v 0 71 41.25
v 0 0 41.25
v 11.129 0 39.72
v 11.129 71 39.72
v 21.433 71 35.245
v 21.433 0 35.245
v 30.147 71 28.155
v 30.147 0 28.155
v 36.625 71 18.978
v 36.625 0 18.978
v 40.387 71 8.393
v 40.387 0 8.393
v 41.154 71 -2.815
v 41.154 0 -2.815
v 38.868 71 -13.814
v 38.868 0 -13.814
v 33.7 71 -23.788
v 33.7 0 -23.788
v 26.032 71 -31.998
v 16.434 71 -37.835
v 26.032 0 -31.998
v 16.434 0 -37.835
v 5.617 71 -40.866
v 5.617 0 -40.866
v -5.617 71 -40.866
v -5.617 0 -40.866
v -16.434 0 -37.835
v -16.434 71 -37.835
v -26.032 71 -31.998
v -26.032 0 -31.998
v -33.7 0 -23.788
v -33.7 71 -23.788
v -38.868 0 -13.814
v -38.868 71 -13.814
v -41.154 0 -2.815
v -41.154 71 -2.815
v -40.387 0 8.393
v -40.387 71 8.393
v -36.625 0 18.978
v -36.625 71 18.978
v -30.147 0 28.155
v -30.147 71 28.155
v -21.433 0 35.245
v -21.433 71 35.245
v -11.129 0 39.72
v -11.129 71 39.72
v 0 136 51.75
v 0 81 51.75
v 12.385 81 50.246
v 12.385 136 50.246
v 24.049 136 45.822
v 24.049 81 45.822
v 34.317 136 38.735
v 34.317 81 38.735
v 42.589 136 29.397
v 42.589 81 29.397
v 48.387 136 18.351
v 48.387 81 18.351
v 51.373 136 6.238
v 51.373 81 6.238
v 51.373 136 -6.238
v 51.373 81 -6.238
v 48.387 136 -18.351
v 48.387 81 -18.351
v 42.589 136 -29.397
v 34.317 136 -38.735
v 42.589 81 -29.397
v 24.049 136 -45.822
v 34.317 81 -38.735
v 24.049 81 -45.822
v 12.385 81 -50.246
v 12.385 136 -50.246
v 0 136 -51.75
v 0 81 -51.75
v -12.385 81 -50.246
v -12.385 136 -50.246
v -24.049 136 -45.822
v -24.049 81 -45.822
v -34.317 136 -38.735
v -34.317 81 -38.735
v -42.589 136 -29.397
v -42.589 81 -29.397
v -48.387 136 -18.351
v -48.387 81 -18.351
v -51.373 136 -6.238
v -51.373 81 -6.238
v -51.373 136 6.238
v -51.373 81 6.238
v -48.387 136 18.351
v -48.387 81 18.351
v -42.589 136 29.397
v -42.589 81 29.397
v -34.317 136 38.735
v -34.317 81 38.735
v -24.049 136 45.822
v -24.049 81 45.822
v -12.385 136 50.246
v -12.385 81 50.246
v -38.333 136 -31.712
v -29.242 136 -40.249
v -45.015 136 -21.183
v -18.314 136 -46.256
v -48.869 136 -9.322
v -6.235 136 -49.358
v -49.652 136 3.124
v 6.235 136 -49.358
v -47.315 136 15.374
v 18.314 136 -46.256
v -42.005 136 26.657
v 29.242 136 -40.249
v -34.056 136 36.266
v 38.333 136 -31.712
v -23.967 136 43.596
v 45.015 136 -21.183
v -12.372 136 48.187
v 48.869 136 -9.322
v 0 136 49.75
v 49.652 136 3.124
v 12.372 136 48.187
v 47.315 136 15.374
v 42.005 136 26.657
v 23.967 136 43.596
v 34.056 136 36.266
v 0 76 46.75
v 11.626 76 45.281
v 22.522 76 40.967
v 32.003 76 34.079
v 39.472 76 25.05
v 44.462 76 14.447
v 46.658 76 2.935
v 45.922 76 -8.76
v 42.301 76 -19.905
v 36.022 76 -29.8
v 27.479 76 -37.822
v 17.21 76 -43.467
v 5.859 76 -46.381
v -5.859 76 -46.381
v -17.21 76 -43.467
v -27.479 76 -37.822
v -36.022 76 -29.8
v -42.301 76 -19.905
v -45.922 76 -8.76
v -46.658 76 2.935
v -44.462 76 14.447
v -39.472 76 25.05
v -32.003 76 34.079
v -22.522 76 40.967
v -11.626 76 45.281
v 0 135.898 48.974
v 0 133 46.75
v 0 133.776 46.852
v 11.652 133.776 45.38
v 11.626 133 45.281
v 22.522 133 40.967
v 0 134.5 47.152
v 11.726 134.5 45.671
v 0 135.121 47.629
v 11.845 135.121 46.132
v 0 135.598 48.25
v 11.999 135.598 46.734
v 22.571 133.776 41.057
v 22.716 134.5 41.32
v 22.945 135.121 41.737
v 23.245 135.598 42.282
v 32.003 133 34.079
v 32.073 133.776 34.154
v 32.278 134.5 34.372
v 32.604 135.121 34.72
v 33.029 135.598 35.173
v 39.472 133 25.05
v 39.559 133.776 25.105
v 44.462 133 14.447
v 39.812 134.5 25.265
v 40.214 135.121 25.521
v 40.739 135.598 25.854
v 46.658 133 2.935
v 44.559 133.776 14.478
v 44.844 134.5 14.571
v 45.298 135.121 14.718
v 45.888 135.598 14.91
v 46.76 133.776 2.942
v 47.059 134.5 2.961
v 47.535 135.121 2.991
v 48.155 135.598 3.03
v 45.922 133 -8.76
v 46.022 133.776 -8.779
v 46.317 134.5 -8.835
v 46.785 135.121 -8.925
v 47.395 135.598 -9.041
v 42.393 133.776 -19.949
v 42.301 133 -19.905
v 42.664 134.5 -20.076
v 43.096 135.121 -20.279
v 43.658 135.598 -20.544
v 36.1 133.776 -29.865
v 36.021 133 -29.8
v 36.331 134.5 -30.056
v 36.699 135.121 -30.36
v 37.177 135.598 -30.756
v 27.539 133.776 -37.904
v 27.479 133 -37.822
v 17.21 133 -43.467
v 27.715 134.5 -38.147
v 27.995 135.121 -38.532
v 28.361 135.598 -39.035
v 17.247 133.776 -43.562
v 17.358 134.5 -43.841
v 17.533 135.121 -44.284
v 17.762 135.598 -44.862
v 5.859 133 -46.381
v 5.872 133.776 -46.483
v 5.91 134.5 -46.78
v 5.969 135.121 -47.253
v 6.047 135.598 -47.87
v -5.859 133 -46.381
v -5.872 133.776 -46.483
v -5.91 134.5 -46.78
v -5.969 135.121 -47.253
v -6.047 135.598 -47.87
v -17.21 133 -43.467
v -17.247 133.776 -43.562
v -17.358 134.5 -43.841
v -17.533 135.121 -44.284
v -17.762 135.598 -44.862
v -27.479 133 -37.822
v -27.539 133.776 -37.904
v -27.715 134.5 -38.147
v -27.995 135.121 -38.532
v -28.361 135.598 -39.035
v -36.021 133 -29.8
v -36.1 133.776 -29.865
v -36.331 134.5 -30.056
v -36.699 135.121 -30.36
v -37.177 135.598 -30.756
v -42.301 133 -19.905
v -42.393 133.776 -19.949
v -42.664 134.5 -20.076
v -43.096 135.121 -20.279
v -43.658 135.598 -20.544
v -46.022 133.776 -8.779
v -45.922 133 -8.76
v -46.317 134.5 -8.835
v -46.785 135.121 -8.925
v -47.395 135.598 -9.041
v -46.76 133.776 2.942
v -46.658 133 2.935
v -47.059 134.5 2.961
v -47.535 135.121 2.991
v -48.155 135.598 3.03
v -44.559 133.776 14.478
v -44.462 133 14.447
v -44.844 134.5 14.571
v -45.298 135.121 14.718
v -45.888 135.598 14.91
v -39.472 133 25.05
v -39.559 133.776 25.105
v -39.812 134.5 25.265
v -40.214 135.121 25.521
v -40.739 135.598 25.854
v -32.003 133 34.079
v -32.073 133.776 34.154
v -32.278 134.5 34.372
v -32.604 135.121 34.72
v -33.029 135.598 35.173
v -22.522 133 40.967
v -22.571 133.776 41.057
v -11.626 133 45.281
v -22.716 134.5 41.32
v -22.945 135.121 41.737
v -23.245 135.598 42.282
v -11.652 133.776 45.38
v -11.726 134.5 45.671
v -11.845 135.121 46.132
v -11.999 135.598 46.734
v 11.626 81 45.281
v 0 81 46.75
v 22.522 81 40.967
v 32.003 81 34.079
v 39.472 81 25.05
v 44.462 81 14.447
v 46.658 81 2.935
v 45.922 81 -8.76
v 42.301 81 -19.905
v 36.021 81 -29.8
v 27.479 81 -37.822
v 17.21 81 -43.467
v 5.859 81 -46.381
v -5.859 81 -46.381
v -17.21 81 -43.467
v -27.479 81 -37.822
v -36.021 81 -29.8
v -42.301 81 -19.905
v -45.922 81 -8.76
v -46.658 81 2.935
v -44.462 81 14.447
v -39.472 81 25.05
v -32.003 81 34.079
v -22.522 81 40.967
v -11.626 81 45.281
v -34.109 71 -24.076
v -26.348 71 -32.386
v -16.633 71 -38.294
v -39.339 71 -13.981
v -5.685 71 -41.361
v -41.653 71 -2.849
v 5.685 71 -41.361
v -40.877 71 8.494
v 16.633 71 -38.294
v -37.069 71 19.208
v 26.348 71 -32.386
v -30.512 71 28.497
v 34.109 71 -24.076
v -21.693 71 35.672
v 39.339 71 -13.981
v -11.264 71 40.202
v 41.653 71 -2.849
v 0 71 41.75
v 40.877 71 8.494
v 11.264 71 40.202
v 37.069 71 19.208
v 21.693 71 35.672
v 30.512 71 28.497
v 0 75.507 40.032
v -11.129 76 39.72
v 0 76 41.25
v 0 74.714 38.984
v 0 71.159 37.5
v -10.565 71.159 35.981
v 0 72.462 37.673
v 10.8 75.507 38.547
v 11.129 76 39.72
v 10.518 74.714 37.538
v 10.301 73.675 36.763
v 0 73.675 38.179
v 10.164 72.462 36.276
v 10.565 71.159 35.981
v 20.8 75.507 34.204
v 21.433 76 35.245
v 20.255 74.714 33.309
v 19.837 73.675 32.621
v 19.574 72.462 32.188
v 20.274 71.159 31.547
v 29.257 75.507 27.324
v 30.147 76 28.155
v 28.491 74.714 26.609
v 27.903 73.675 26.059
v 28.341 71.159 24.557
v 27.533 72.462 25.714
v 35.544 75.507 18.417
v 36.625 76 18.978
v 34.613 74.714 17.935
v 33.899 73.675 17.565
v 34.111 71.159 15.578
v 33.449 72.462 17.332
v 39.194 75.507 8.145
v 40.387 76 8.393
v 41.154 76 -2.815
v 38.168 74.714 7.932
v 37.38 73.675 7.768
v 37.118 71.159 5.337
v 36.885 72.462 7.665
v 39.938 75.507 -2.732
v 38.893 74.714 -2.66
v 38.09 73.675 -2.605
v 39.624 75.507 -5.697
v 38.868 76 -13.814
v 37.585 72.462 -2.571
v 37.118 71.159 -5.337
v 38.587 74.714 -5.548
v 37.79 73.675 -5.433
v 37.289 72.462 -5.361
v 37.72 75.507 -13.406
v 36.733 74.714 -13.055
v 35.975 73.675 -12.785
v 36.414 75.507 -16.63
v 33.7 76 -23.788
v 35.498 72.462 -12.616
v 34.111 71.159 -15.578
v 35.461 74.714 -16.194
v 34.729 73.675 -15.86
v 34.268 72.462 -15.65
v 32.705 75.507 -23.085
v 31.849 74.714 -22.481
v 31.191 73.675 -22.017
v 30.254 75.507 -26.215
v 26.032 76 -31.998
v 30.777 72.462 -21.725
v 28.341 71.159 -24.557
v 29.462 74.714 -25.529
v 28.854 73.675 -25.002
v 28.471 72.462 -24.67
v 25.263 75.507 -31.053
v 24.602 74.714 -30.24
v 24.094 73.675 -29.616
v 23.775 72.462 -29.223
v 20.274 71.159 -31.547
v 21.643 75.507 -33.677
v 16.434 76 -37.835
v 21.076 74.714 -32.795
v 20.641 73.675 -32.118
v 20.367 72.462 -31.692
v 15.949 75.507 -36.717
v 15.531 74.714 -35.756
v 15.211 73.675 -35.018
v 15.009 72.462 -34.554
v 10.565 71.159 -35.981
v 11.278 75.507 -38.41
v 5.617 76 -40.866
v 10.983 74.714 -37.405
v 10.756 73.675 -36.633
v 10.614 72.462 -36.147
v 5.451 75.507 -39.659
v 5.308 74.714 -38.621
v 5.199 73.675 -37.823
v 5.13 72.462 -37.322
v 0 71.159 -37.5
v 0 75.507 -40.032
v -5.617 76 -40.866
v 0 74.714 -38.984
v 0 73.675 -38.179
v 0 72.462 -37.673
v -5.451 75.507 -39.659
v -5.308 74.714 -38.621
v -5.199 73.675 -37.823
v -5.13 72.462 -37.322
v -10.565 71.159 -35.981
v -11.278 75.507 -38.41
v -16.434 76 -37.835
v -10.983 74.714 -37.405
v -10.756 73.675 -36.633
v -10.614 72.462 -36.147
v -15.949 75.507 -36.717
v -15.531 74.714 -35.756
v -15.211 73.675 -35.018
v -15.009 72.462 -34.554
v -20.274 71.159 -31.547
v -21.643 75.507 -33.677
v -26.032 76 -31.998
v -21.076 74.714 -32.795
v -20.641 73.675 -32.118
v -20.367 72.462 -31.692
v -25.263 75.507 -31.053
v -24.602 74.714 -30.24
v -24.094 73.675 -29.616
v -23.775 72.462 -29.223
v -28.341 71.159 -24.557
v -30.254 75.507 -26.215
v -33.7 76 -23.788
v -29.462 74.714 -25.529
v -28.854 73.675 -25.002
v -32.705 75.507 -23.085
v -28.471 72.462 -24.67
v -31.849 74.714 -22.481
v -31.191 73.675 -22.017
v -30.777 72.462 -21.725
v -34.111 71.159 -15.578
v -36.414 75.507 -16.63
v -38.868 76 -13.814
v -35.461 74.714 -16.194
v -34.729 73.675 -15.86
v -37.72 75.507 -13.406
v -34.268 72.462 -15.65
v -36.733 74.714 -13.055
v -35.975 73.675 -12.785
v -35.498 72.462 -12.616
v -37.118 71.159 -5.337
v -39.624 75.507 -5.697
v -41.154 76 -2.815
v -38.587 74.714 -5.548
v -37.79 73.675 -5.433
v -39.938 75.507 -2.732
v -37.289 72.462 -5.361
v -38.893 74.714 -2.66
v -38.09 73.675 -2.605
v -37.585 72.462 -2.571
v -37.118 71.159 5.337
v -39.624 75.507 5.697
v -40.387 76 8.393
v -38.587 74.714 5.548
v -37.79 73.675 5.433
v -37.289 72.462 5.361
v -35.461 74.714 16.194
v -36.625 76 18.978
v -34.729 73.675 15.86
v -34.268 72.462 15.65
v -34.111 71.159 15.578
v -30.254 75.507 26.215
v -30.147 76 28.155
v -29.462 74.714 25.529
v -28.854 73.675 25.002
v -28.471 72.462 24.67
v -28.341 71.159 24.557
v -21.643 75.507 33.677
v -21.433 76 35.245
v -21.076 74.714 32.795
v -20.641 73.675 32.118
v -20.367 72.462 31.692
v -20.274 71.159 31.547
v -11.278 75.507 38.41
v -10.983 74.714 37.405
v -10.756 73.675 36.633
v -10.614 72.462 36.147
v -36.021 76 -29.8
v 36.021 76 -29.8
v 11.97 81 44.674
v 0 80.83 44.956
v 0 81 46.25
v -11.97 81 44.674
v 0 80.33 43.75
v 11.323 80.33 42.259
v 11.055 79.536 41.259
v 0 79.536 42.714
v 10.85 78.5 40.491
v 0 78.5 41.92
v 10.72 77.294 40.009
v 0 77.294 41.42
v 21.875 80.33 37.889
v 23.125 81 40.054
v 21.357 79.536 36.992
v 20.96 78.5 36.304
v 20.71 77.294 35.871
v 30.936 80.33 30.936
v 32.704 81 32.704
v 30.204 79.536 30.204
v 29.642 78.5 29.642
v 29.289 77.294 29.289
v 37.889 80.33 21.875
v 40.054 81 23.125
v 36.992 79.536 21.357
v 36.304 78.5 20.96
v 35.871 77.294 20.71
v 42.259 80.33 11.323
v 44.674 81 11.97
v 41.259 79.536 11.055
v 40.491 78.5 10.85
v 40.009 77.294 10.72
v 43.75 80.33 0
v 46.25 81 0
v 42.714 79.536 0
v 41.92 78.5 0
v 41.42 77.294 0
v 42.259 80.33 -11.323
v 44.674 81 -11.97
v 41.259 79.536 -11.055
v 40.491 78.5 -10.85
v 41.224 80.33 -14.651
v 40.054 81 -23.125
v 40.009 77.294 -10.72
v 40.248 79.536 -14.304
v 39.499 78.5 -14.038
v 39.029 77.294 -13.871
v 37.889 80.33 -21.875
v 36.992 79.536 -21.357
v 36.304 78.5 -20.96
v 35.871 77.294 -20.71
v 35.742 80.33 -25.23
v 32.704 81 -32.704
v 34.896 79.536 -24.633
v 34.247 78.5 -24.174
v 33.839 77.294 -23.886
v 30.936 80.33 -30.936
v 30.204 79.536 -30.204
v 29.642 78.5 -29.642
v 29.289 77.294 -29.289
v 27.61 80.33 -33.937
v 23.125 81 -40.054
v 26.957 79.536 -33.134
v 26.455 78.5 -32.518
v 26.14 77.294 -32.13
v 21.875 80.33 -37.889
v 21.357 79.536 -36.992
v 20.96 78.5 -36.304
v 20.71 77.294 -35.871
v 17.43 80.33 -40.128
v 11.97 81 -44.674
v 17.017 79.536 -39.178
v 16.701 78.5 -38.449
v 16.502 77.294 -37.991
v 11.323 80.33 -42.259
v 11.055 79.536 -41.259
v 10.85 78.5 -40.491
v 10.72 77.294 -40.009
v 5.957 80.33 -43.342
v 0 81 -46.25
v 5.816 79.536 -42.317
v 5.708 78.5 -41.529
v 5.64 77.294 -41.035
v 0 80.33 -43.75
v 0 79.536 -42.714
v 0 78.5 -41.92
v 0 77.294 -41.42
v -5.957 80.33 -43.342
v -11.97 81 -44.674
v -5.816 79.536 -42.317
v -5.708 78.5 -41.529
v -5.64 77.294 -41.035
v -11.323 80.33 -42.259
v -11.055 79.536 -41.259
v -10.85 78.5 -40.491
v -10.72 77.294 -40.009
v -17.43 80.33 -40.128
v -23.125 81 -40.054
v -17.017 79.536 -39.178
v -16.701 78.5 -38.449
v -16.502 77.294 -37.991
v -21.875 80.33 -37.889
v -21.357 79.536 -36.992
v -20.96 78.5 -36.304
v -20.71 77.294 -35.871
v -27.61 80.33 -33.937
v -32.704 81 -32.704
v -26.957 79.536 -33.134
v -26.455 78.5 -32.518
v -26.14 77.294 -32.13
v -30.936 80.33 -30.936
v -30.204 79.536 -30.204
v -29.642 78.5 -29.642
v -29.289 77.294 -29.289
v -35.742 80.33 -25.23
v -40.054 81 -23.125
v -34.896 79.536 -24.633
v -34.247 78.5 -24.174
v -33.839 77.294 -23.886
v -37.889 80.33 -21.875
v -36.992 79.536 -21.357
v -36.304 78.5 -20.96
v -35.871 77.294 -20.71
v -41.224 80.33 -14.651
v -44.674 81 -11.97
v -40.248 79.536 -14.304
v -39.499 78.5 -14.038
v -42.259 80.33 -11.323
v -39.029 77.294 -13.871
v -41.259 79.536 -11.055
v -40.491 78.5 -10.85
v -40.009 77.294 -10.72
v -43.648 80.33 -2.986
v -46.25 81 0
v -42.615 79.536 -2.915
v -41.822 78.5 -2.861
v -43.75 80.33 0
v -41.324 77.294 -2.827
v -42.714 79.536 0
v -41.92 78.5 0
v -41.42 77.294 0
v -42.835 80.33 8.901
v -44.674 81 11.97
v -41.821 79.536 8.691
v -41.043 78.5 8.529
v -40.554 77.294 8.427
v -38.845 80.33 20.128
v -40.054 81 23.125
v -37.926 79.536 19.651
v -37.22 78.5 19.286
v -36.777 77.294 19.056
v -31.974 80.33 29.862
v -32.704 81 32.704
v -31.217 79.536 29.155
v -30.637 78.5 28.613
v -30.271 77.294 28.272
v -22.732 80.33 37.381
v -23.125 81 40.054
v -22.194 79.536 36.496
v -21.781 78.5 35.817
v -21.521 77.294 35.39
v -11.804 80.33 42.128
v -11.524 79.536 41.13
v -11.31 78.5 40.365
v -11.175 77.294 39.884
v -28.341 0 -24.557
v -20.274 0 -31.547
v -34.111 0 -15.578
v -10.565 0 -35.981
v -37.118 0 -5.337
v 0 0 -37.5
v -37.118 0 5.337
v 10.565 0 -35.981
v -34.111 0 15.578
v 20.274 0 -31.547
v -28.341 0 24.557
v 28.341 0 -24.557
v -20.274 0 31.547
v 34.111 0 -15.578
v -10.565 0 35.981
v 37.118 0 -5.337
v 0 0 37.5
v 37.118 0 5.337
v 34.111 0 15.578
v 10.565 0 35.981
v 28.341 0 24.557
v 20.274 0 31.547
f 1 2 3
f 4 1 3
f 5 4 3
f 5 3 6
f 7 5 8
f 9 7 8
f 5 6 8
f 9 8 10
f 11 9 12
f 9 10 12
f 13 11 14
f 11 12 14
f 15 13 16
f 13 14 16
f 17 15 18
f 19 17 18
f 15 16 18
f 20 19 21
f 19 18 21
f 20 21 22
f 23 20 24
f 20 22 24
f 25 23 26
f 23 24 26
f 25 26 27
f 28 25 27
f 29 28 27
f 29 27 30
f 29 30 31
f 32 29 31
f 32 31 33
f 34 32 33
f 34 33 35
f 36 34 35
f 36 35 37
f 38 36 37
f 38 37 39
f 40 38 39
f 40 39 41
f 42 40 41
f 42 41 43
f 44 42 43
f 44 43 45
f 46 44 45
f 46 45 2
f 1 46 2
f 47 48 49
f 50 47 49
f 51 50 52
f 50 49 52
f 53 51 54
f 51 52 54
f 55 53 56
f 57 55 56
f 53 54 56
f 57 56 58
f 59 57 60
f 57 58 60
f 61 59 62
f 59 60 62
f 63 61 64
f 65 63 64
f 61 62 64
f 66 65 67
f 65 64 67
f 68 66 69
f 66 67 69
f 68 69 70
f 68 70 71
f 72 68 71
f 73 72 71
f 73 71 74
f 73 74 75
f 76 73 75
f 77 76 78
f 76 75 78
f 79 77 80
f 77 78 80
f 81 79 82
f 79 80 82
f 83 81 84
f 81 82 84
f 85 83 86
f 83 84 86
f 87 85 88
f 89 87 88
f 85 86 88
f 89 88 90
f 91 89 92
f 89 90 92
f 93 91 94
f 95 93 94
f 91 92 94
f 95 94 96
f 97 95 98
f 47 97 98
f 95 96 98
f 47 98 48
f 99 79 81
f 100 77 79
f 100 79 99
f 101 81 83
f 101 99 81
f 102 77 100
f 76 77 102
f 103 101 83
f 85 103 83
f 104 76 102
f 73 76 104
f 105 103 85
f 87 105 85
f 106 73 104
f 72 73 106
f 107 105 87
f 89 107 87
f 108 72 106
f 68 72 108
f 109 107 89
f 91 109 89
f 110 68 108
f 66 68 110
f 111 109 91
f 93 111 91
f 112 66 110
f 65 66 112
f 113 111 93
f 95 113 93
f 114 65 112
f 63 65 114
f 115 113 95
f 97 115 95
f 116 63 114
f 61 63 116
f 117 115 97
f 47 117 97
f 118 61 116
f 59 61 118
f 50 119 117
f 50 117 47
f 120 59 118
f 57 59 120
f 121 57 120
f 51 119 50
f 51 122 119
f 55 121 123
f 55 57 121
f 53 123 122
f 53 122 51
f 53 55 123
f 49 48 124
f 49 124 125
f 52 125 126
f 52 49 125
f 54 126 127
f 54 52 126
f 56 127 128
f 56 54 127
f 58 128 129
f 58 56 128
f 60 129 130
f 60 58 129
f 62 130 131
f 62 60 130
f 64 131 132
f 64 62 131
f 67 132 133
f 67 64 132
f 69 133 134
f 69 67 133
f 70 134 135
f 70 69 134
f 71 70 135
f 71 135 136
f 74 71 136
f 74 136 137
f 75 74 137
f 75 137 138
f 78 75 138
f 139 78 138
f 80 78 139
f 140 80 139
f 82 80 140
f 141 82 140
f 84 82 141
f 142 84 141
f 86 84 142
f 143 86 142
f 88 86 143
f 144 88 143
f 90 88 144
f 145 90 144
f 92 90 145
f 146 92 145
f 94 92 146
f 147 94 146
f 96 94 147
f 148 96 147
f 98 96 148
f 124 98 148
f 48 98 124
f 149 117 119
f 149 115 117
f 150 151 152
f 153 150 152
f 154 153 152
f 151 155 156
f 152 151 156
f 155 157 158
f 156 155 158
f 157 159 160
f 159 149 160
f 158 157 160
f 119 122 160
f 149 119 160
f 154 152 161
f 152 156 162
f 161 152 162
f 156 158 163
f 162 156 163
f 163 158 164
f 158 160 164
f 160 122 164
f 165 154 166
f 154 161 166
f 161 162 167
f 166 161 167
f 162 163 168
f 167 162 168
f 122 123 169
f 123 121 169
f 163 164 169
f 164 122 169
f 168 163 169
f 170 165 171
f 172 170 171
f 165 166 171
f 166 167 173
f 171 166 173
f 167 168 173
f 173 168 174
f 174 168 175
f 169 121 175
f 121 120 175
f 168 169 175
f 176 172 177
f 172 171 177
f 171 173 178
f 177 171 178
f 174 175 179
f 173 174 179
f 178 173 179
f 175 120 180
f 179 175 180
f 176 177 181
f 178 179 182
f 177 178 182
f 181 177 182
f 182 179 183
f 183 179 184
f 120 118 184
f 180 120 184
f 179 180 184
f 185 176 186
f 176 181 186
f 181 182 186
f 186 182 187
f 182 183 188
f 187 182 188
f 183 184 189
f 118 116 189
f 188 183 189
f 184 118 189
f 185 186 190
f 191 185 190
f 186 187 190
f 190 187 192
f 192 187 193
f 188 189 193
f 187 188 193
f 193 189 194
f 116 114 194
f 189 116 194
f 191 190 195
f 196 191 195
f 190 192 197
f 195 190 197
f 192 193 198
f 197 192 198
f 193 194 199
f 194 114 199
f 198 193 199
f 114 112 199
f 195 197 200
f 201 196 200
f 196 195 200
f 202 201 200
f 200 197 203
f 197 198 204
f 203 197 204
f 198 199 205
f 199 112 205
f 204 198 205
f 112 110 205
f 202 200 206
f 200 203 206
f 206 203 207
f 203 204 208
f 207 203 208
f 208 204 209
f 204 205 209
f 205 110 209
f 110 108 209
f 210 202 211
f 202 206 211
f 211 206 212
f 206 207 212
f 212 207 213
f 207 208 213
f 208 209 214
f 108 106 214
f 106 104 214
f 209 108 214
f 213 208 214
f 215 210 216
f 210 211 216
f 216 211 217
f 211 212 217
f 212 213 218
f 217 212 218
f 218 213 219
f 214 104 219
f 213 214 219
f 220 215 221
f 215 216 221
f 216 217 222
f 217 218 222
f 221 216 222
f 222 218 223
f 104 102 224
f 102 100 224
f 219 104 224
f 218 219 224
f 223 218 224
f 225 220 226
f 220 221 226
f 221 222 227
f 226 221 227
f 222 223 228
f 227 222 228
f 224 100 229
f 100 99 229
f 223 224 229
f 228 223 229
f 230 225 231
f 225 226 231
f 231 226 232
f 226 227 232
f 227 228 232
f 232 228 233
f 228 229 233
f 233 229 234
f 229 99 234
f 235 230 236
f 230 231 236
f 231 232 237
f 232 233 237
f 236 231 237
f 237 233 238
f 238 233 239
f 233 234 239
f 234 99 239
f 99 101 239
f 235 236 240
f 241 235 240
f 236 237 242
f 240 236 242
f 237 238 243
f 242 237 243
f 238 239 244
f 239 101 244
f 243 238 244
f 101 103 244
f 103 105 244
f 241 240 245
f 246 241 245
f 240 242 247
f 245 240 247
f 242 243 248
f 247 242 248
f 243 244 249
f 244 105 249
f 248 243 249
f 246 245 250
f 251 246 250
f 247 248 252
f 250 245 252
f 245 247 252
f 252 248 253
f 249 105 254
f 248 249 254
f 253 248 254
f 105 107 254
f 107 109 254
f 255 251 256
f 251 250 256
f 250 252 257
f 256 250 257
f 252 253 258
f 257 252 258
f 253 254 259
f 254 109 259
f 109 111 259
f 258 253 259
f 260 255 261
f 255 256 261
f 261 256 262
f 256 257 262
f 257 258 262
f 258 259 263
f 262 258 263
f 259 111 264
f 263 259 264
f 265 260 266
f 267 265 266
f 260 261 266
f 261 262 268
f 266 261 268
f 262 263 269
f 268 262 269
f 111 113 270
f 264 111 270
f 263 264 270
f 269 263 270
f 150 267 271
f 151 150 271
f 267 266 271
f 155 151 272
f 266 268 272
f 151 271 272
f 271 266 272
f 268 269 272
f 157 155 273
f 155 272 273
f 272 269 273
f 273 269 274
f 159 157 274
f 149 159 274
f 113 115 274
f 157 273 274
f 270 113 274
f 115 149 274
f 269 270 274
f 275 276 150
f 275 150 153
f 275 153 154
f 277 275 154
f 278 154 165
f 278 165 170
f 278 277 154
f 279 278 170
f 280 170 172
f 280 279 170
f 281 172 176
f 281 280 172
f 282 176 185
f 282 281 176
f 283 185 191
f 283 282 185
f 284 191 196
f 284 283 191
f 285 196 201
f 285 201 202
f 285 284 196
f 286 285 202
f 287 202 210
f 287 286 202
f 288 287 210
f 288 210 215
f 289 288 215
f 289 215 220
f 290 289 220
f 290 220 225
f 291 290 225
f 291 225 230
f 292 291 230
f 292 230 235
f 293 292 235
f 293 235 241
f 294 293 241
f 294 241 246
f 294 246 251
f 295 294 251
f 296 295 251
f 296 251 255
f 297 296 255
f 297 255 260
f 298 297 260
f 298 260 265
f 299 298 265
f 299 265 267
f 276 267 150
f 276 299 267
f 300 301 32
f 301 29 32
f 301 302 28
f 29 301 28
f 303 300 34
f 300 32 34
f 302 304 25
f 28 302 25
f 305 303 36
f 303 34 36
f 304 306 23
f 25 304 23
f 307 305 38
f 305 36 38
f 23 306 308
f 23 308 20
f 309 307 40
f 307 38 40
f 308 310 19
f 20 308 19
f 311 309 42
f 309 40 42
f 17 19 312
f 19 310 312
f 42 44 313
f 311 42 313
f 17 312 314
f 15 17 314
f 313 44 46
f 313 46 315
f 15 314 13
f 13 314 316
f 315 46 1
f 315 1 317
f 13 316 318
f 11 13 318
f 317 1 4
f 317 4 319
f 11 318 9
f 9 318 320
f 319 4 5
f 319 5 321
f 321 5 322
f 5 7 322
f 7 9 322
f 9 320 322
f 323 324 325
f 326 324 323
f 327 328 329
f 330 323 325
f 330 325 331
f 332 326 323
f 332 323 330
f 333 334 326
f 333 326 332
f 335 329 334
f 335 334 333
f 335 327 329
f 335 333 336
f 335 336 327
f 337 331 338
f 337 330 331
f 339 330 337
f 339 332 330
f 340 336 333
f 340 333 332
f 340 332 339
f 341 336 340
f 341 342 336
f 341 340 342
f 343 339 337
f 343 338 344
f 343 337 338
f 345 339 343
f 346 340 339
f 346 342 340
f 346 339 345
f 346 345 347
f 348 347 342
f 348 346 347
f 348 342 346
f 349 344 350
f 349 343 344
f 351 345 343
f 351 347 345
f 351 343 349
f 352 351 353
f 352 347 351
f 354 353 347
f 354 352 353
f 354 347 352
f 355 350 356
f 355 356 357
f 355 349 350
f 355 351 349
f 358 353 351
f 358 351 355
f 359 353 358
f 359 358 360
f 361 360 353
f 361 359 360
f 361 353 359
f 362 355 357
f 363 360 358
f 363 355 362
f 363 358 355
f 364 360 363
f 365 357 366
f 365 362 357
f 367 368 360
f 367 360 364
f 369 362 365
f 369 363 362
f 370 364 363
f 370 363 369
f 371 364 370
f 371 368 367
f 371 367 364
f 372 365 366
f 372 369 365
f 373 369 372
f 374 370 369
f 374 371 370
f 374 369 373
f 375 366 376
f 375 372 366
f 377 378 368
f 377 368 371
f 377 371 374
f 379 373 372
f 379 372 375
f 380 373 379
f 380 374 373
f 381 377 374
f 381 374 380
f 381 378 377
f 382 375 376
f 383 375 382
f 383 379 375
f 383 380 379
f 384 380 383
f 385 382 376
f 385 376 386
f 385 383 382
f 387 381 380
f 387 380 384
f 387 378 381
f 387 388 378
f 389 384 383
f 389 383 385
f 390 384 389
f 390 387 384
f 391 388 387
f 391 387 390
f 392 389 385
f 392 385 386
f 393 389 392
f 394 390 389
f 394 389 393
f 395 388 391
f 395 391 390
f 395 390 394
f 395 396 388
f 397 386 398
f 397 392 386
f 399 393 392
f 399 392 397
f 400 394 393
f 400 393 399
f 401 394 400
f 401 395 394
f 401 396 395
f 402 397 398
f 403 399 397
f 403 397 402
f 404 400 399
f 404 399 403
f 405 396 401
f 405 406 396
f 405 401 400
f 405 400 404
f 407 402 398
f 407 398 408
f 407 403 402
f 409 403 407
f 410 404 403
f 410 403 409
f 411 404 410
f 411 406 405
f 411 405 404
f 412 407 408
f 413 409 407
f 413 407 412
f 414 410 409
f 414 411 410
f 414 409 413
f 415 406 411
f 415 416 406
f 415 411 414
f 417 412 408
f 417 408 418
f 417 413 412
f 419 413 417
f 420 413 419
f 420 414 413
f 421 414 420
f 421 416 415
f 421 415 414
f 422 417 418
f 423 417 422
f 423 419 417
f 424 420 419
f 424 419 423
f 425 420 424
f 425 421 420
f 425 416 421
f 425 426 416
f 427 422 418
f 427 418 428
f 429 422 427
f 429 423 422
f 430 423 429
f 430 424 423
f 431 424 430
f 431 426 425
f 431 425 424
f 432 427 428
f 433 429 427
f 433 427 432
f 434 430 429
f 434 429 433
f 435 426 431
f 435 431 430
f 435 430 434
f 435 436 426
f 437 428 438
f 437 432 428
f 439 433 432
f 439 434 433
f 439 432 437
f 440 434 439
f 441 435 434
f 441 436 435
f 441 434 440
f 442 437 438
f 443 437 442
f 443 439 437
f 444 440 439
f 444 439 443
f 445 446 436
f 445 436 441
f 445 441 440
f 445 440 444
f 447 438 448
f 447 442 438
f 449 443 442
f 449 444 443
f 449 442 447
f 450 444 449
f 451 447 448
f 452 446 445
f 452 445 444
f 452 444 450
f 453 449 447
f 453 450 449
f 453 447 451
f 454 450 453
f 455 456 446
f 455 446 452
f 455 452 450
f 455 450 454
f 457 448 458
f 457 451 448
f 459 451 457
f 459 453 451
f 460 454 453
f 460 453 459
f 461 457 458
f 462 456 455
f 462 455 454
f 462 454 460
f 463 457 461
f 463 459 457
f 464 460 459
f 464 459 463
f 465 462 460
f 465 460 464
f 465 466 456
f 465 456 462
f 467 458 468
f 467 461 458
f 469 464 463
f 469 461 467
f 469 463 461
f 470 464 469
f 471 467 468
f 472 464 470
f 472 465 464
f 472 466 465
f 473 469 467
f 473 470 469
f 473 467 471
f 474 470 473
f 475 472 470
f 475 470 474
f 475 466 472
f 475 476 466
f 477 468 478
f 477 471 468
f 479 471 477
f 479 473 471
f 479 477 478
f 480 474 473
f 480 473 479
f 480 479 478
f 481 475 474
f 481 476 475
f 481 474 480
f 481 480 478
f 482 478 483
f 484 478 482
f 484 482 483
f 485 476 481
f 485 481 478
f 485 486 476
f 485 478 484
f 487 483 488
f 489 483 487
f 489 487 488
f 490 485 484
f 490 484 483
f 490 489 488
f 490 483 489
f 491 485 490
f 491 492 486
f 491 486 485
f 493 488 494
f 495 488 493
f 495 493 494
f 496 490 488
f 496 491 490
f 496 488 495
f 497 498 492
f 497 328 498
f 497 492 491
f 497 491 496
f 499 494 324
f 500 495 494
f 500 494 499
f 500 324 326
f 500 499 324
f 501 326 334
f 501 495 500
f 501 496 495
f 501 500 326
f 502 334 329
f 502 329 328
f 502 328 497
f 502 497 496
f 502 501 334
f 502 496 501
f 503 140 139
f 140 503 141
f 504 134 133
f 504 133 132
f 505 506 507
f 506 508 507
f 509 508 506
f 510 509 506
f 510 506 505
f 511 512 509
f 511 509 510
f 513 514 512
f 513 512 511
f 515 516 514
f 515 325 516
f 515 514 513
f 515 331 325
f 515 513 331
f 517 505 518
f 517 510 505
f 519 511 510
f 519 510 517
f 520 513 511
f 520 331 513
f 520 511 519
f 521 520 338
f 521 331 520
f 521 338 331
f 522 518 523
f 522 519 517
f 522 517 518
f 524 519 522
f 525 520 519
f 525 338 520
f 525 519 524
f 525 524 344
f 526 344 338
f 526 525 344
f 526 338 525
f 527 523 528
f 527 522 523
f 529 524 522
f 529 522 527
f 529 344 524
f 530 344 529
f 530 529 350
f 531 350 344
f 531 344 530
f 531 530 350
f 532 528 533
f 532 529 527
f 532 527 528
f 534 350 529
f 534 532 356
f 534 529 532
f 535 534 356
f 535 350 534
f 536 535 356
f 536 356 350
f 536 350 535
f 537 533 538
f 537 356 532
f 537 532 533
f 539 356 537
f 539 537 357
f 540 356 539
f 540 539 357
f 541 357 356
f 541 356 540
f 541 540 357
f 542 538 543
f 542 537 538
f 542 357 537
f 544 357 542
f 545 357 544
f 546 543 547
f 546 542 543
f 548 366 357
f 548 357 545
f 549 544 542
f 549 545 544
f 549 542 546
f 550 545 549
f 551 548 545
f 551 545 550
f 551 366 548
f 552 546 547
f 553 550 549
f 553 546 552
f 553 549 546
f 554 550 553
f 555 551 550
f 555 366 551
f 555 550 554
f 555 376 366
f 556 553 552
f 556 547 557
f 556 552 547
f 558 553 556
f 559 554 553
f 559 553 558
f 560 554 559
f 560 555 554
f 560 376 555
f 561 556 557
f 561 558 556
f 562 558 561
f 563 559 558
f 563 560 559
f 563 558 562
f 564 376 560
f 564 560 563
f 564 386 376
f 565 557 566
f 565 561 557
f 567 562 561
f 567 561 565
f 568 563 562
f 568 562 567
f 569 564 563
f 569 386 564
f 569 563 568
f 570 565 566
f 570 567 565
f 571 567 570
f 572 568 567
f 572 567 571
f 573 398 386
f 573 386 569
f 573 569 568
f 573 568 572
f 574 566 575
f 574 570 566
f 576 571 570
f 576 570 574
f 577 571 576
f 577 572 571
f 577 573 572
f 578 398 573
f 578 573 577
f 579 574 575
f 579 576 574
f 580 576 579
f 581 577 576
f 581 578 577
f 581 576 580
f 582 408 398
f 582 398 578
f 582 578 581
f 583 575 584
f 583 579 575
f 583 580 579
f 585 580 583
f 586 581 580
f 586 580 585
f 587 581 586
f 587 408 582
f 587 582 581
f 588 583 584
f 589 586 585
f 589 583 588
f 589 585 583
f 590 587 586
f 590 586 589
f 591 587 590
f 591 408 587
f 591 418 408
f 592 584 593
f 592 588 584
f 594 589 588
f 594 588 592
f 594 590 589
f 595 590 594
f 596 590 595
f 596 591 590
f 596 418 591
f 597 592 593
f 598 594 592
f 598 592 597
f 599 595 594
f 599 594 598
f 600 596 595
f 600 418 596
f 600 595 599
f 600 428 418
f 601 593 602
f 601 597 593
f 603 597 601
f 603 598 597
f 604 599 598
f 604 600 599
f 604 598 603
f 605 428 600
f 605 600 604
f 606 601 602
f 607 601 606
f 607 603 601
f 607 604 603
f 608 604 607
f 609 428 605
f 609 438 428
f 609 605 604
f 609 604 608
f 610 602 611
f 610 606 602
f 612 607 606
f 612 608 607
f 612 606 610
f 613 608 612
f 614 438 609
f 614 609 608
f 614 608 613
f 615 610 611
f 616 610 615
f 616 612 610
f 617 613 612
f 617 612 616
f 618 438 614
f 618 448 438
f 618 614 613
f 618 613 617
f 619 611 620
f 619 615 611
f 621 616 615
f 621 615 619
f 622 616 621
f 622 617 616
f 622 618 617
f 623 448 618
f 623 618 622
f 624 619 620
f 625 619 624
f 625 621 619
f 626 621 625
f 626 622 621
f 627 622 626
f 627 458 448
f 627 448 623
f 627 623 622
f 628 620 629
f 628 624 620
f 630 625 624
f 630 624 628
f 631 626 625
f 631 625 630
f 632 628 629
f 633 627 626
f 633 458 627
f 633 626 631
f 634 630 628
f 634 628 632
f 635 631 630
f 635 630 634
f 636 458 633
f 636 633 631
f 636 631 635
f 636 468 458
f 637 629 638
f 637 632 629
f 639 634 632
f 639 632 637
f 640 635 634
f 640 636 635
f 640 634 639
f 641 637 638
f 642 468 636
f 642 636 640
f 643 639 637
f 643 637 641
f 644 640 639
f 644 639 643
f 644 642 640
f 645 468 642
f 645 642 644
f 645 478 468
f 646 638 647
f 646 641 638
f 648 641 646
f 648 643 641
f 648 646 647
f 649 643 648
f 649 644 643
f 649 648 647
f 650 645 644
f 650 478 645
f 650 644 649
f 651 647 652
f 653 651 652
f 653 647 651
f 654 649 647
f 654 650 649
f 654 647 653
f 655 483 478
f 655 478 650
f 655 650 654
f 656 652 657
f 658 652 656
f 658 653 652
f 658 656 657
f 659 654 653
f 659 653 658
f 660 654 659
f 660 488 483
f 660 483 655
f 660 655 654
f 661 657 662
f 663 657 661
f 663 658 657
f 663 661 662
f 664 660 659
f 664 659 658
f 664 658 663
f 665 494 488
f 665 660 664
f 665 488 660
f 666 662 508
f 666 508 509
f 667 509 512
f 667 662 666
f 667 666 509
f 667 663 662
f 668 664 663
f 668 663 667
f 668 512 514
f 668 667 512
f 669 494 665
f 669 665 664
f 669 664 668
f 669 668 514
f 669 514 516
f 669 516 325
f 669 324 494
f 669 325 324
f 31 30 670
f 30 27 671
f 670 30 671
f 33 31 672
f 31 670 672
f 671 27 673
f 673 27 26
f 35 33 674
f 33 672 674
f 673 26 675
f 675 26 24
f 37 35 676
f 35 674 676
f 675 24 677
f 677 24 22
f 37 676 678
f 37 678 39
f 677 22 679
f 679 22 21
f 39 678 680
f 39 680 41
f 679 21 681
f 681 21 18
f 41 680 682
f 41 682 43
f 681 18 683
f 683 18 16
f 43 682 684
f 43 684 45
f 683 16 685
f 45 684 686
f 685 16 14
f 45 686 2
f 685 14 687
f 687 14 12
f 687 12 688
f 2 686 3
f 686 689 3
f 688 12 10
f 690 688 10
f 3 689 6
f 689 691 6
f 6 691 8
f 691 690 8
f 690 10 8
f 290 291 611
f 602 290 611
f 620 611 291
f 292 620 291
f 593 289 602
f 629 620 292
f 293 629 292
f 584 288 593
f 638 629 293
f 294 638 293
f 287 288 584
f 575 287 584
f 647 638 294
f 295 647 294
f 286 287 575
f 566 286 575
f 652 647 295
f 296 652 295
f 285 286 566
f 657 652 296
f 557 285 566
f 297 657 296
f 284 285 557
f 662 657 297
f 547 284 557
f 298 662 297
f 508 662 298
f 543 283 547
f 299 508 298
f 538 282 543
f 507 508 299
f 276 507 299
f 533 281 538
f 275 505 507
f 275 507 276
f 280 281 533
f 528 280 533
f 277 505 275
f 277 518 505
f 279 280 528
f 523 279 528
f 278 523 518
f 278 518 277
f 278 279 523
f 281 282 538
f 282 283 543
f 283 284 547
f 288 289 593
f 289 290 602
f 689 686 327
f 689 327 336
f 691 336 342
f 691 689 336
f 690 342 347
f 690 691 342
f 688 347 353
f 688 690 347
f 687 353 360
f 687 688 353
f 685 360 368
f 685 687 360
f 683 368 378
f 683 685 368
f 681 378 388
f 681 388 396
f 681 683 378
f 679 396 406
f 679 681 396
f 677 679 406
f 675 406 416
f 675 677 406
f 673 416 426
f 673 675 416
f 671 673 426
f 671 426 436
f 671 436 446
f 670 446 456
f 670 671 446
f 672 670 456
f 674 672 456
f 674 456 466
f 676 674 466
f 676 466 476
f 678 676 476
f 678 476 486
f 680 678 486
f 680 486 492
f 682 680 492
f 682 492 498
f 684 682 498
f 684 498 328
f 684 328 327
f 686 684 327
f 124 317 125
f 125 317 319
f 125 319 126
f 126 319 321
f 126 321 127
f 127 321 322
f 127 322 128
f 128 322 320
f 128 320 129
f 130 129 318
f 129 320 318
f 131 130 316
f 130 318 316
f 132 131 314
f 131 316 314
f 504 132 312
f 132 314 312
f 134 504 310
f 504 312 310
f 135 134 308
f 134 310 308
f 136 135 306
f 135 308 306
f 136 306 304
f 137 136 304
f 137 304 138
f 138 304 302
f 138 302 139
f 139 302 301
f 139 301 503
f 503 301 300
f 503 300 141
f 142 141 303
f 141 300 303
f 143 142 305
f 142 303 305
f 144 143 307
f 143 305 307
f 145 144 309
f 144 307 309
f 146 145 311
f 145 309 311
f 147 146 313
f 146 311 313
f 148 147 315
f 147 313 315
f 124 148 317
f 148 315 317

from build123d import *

# Parameters (mm, degrees)
SKETCH1_R                = 41.25
SKETCH1_R_2              = 37.5
BOSS_EXTRUDE2_DEPTH      = 76
SKETCH2_R                = 51.75
SKETCH2_R_2              = 46.75
BOSS_EXTRUDE3_DEPTH      = 60
BOSS_EXTRUDE5_DEPTH      = 5
BOSS_EXTRUDE5_DEPTH_BACK = 5
SKETCH3_R                = 46.75
SKETCH3_R_2              = 41.25
CHAMFER1_SIZE            = 5
CHAMFER2_SIZE            = 5
FILLET1_R                = 5
FILLET2_R                = 5
FILLET3_R                = 3


# Some blends are built 0.0001 mm under size
with BuildPart() as part:
    # Sketch1 → Boss-Extrude2 (new body)
    with BuildSketch(Plane(origin=(0, 0, 0), x_dir=(1, 0, 0), z_dir=(0, 1, 0))):
        with Locations(Location((0, 0, 0), (0, 0, 270))):
            Circle(SKETCH1_R)
        with Locations(Location((0, 0, 0), (0, 0, 270))):
            Circle(SKETCH1_R_2, mode=Mode.SUBTRACT)
    extrude(amount=BOSS_EXTRUDE2_DEPTH)



with BuildPart() as body_2:
    # Sketch2 → Boss-Extrude3 (new body)
    with BuildSketch(Plane(origin=(0, 76, 0), x_dir=(1, 0, 0), z_dir=(0, 1, 0))):
        with Locations(Location((0, 0, 0), (0, 0, 270))):
            Circle(SKETCH2_R)
        with Locations(Location((0, 0, 0), (0, 0, 270))):
            Circle(SKETCH2_R_2, mode=Mode.SUBTRACT)
    extrude(amount=BOSS_EXTRUDE3_DEPTH)


with BuildPart() as part_1:
    add(part.part)

    add(body_2.part)  # Boss-Extrude5 merges body 2
    # Sketch3 → Boss-Extrude5 (add, two sides: drawn at the far end of the back side and taken through both)
    with BuildSketch(Plane(origin=(0, 76, 0), x_dir=(1, 0, 0), z_dir=(0, 1, 0)).offset(-BOSS_EXTRUDE5_DEPTH_BACK)):
        with Locations(Location((0, 0, 0), (0, 0, 270))):
            Circle(SKETCH3_R)
        with Locations(Location((0, 0, 0), (0, 0, 270))):
            Circle(SKETCH3_R_2, mode=Mode.SUBTRACT)
    extrude(amount=BOSS_EXTRUDE5_DEPTH + BOSS_EXTRUDE5_DEPTH_BACK)

    # Chamfer1
    chamfer1_edges = [part_1.edges().sort_by_distance(p)[0] for p in [
        (0, 71, -46.75),
    ]]
    chamfer(chamfer1_edges, length=CHAMFER1_SIZE - 0.0001)  # a hair under: the kernel refuses the full size

    # Chamfer2
    chamfer2_edges = [part_1.edges().sort_by_distance(p)[0] for p in [
        (0, 76, -51.75),
    ]]
    chamfer(chamfer2_edges, length=CHAMFER2_SIZE - 0.0001)  # a hair under: the kernel refuses the full size

    # Fillet1
    fillet1_edges = [part_1.edges().sort_by_distance(p)[0] for p in [
        (0, 81, -41.25),
    ]]
    fillet(fillet1_edges, radius=FILLET1_R - 0.0001)  # a hair under: the kernel refuses the full size

    # Fillet2
    # the kernel refuses this fillet: 5 mm, written as the material it takes off along each edge
    with BuildSketch(Plane(origin=(0, 76, 0), x_dir=(0, 0, 1), z_dir=(-1, 0, 0))) as fillet2_piece_1:
        with BuildLine():
            CenterArc((42.5, -4.841229183), FILLET2_R, 104.477512186, 75.522487814)
            Line((37.5, -4.841229183), (37.4, -4.841229183))
            Line((37.4, -4.841229183), (37.4, 0))
            Line((37.4, 0), (37.5, 0.1))
            ThreePointArc((37.5, 0.1), (39.375, 0.1), (41.225, 0.096824584))
            Line((41.225, 0.096824584), (41.25, 0))
        make_face()
    revolve(axis=Axis((0, 76, 0), (0, 1, 0)), mode=Mode.SUBTRACT)

    # Fillet3
    fillet3_edges = [part_1.edges().sort_by_distance(p)[0] for p in [
        (0, 136, -46.75),
    ]]
    fillet(fillet3_edges, radius=FILLET3_R)


solid = part_1.part
